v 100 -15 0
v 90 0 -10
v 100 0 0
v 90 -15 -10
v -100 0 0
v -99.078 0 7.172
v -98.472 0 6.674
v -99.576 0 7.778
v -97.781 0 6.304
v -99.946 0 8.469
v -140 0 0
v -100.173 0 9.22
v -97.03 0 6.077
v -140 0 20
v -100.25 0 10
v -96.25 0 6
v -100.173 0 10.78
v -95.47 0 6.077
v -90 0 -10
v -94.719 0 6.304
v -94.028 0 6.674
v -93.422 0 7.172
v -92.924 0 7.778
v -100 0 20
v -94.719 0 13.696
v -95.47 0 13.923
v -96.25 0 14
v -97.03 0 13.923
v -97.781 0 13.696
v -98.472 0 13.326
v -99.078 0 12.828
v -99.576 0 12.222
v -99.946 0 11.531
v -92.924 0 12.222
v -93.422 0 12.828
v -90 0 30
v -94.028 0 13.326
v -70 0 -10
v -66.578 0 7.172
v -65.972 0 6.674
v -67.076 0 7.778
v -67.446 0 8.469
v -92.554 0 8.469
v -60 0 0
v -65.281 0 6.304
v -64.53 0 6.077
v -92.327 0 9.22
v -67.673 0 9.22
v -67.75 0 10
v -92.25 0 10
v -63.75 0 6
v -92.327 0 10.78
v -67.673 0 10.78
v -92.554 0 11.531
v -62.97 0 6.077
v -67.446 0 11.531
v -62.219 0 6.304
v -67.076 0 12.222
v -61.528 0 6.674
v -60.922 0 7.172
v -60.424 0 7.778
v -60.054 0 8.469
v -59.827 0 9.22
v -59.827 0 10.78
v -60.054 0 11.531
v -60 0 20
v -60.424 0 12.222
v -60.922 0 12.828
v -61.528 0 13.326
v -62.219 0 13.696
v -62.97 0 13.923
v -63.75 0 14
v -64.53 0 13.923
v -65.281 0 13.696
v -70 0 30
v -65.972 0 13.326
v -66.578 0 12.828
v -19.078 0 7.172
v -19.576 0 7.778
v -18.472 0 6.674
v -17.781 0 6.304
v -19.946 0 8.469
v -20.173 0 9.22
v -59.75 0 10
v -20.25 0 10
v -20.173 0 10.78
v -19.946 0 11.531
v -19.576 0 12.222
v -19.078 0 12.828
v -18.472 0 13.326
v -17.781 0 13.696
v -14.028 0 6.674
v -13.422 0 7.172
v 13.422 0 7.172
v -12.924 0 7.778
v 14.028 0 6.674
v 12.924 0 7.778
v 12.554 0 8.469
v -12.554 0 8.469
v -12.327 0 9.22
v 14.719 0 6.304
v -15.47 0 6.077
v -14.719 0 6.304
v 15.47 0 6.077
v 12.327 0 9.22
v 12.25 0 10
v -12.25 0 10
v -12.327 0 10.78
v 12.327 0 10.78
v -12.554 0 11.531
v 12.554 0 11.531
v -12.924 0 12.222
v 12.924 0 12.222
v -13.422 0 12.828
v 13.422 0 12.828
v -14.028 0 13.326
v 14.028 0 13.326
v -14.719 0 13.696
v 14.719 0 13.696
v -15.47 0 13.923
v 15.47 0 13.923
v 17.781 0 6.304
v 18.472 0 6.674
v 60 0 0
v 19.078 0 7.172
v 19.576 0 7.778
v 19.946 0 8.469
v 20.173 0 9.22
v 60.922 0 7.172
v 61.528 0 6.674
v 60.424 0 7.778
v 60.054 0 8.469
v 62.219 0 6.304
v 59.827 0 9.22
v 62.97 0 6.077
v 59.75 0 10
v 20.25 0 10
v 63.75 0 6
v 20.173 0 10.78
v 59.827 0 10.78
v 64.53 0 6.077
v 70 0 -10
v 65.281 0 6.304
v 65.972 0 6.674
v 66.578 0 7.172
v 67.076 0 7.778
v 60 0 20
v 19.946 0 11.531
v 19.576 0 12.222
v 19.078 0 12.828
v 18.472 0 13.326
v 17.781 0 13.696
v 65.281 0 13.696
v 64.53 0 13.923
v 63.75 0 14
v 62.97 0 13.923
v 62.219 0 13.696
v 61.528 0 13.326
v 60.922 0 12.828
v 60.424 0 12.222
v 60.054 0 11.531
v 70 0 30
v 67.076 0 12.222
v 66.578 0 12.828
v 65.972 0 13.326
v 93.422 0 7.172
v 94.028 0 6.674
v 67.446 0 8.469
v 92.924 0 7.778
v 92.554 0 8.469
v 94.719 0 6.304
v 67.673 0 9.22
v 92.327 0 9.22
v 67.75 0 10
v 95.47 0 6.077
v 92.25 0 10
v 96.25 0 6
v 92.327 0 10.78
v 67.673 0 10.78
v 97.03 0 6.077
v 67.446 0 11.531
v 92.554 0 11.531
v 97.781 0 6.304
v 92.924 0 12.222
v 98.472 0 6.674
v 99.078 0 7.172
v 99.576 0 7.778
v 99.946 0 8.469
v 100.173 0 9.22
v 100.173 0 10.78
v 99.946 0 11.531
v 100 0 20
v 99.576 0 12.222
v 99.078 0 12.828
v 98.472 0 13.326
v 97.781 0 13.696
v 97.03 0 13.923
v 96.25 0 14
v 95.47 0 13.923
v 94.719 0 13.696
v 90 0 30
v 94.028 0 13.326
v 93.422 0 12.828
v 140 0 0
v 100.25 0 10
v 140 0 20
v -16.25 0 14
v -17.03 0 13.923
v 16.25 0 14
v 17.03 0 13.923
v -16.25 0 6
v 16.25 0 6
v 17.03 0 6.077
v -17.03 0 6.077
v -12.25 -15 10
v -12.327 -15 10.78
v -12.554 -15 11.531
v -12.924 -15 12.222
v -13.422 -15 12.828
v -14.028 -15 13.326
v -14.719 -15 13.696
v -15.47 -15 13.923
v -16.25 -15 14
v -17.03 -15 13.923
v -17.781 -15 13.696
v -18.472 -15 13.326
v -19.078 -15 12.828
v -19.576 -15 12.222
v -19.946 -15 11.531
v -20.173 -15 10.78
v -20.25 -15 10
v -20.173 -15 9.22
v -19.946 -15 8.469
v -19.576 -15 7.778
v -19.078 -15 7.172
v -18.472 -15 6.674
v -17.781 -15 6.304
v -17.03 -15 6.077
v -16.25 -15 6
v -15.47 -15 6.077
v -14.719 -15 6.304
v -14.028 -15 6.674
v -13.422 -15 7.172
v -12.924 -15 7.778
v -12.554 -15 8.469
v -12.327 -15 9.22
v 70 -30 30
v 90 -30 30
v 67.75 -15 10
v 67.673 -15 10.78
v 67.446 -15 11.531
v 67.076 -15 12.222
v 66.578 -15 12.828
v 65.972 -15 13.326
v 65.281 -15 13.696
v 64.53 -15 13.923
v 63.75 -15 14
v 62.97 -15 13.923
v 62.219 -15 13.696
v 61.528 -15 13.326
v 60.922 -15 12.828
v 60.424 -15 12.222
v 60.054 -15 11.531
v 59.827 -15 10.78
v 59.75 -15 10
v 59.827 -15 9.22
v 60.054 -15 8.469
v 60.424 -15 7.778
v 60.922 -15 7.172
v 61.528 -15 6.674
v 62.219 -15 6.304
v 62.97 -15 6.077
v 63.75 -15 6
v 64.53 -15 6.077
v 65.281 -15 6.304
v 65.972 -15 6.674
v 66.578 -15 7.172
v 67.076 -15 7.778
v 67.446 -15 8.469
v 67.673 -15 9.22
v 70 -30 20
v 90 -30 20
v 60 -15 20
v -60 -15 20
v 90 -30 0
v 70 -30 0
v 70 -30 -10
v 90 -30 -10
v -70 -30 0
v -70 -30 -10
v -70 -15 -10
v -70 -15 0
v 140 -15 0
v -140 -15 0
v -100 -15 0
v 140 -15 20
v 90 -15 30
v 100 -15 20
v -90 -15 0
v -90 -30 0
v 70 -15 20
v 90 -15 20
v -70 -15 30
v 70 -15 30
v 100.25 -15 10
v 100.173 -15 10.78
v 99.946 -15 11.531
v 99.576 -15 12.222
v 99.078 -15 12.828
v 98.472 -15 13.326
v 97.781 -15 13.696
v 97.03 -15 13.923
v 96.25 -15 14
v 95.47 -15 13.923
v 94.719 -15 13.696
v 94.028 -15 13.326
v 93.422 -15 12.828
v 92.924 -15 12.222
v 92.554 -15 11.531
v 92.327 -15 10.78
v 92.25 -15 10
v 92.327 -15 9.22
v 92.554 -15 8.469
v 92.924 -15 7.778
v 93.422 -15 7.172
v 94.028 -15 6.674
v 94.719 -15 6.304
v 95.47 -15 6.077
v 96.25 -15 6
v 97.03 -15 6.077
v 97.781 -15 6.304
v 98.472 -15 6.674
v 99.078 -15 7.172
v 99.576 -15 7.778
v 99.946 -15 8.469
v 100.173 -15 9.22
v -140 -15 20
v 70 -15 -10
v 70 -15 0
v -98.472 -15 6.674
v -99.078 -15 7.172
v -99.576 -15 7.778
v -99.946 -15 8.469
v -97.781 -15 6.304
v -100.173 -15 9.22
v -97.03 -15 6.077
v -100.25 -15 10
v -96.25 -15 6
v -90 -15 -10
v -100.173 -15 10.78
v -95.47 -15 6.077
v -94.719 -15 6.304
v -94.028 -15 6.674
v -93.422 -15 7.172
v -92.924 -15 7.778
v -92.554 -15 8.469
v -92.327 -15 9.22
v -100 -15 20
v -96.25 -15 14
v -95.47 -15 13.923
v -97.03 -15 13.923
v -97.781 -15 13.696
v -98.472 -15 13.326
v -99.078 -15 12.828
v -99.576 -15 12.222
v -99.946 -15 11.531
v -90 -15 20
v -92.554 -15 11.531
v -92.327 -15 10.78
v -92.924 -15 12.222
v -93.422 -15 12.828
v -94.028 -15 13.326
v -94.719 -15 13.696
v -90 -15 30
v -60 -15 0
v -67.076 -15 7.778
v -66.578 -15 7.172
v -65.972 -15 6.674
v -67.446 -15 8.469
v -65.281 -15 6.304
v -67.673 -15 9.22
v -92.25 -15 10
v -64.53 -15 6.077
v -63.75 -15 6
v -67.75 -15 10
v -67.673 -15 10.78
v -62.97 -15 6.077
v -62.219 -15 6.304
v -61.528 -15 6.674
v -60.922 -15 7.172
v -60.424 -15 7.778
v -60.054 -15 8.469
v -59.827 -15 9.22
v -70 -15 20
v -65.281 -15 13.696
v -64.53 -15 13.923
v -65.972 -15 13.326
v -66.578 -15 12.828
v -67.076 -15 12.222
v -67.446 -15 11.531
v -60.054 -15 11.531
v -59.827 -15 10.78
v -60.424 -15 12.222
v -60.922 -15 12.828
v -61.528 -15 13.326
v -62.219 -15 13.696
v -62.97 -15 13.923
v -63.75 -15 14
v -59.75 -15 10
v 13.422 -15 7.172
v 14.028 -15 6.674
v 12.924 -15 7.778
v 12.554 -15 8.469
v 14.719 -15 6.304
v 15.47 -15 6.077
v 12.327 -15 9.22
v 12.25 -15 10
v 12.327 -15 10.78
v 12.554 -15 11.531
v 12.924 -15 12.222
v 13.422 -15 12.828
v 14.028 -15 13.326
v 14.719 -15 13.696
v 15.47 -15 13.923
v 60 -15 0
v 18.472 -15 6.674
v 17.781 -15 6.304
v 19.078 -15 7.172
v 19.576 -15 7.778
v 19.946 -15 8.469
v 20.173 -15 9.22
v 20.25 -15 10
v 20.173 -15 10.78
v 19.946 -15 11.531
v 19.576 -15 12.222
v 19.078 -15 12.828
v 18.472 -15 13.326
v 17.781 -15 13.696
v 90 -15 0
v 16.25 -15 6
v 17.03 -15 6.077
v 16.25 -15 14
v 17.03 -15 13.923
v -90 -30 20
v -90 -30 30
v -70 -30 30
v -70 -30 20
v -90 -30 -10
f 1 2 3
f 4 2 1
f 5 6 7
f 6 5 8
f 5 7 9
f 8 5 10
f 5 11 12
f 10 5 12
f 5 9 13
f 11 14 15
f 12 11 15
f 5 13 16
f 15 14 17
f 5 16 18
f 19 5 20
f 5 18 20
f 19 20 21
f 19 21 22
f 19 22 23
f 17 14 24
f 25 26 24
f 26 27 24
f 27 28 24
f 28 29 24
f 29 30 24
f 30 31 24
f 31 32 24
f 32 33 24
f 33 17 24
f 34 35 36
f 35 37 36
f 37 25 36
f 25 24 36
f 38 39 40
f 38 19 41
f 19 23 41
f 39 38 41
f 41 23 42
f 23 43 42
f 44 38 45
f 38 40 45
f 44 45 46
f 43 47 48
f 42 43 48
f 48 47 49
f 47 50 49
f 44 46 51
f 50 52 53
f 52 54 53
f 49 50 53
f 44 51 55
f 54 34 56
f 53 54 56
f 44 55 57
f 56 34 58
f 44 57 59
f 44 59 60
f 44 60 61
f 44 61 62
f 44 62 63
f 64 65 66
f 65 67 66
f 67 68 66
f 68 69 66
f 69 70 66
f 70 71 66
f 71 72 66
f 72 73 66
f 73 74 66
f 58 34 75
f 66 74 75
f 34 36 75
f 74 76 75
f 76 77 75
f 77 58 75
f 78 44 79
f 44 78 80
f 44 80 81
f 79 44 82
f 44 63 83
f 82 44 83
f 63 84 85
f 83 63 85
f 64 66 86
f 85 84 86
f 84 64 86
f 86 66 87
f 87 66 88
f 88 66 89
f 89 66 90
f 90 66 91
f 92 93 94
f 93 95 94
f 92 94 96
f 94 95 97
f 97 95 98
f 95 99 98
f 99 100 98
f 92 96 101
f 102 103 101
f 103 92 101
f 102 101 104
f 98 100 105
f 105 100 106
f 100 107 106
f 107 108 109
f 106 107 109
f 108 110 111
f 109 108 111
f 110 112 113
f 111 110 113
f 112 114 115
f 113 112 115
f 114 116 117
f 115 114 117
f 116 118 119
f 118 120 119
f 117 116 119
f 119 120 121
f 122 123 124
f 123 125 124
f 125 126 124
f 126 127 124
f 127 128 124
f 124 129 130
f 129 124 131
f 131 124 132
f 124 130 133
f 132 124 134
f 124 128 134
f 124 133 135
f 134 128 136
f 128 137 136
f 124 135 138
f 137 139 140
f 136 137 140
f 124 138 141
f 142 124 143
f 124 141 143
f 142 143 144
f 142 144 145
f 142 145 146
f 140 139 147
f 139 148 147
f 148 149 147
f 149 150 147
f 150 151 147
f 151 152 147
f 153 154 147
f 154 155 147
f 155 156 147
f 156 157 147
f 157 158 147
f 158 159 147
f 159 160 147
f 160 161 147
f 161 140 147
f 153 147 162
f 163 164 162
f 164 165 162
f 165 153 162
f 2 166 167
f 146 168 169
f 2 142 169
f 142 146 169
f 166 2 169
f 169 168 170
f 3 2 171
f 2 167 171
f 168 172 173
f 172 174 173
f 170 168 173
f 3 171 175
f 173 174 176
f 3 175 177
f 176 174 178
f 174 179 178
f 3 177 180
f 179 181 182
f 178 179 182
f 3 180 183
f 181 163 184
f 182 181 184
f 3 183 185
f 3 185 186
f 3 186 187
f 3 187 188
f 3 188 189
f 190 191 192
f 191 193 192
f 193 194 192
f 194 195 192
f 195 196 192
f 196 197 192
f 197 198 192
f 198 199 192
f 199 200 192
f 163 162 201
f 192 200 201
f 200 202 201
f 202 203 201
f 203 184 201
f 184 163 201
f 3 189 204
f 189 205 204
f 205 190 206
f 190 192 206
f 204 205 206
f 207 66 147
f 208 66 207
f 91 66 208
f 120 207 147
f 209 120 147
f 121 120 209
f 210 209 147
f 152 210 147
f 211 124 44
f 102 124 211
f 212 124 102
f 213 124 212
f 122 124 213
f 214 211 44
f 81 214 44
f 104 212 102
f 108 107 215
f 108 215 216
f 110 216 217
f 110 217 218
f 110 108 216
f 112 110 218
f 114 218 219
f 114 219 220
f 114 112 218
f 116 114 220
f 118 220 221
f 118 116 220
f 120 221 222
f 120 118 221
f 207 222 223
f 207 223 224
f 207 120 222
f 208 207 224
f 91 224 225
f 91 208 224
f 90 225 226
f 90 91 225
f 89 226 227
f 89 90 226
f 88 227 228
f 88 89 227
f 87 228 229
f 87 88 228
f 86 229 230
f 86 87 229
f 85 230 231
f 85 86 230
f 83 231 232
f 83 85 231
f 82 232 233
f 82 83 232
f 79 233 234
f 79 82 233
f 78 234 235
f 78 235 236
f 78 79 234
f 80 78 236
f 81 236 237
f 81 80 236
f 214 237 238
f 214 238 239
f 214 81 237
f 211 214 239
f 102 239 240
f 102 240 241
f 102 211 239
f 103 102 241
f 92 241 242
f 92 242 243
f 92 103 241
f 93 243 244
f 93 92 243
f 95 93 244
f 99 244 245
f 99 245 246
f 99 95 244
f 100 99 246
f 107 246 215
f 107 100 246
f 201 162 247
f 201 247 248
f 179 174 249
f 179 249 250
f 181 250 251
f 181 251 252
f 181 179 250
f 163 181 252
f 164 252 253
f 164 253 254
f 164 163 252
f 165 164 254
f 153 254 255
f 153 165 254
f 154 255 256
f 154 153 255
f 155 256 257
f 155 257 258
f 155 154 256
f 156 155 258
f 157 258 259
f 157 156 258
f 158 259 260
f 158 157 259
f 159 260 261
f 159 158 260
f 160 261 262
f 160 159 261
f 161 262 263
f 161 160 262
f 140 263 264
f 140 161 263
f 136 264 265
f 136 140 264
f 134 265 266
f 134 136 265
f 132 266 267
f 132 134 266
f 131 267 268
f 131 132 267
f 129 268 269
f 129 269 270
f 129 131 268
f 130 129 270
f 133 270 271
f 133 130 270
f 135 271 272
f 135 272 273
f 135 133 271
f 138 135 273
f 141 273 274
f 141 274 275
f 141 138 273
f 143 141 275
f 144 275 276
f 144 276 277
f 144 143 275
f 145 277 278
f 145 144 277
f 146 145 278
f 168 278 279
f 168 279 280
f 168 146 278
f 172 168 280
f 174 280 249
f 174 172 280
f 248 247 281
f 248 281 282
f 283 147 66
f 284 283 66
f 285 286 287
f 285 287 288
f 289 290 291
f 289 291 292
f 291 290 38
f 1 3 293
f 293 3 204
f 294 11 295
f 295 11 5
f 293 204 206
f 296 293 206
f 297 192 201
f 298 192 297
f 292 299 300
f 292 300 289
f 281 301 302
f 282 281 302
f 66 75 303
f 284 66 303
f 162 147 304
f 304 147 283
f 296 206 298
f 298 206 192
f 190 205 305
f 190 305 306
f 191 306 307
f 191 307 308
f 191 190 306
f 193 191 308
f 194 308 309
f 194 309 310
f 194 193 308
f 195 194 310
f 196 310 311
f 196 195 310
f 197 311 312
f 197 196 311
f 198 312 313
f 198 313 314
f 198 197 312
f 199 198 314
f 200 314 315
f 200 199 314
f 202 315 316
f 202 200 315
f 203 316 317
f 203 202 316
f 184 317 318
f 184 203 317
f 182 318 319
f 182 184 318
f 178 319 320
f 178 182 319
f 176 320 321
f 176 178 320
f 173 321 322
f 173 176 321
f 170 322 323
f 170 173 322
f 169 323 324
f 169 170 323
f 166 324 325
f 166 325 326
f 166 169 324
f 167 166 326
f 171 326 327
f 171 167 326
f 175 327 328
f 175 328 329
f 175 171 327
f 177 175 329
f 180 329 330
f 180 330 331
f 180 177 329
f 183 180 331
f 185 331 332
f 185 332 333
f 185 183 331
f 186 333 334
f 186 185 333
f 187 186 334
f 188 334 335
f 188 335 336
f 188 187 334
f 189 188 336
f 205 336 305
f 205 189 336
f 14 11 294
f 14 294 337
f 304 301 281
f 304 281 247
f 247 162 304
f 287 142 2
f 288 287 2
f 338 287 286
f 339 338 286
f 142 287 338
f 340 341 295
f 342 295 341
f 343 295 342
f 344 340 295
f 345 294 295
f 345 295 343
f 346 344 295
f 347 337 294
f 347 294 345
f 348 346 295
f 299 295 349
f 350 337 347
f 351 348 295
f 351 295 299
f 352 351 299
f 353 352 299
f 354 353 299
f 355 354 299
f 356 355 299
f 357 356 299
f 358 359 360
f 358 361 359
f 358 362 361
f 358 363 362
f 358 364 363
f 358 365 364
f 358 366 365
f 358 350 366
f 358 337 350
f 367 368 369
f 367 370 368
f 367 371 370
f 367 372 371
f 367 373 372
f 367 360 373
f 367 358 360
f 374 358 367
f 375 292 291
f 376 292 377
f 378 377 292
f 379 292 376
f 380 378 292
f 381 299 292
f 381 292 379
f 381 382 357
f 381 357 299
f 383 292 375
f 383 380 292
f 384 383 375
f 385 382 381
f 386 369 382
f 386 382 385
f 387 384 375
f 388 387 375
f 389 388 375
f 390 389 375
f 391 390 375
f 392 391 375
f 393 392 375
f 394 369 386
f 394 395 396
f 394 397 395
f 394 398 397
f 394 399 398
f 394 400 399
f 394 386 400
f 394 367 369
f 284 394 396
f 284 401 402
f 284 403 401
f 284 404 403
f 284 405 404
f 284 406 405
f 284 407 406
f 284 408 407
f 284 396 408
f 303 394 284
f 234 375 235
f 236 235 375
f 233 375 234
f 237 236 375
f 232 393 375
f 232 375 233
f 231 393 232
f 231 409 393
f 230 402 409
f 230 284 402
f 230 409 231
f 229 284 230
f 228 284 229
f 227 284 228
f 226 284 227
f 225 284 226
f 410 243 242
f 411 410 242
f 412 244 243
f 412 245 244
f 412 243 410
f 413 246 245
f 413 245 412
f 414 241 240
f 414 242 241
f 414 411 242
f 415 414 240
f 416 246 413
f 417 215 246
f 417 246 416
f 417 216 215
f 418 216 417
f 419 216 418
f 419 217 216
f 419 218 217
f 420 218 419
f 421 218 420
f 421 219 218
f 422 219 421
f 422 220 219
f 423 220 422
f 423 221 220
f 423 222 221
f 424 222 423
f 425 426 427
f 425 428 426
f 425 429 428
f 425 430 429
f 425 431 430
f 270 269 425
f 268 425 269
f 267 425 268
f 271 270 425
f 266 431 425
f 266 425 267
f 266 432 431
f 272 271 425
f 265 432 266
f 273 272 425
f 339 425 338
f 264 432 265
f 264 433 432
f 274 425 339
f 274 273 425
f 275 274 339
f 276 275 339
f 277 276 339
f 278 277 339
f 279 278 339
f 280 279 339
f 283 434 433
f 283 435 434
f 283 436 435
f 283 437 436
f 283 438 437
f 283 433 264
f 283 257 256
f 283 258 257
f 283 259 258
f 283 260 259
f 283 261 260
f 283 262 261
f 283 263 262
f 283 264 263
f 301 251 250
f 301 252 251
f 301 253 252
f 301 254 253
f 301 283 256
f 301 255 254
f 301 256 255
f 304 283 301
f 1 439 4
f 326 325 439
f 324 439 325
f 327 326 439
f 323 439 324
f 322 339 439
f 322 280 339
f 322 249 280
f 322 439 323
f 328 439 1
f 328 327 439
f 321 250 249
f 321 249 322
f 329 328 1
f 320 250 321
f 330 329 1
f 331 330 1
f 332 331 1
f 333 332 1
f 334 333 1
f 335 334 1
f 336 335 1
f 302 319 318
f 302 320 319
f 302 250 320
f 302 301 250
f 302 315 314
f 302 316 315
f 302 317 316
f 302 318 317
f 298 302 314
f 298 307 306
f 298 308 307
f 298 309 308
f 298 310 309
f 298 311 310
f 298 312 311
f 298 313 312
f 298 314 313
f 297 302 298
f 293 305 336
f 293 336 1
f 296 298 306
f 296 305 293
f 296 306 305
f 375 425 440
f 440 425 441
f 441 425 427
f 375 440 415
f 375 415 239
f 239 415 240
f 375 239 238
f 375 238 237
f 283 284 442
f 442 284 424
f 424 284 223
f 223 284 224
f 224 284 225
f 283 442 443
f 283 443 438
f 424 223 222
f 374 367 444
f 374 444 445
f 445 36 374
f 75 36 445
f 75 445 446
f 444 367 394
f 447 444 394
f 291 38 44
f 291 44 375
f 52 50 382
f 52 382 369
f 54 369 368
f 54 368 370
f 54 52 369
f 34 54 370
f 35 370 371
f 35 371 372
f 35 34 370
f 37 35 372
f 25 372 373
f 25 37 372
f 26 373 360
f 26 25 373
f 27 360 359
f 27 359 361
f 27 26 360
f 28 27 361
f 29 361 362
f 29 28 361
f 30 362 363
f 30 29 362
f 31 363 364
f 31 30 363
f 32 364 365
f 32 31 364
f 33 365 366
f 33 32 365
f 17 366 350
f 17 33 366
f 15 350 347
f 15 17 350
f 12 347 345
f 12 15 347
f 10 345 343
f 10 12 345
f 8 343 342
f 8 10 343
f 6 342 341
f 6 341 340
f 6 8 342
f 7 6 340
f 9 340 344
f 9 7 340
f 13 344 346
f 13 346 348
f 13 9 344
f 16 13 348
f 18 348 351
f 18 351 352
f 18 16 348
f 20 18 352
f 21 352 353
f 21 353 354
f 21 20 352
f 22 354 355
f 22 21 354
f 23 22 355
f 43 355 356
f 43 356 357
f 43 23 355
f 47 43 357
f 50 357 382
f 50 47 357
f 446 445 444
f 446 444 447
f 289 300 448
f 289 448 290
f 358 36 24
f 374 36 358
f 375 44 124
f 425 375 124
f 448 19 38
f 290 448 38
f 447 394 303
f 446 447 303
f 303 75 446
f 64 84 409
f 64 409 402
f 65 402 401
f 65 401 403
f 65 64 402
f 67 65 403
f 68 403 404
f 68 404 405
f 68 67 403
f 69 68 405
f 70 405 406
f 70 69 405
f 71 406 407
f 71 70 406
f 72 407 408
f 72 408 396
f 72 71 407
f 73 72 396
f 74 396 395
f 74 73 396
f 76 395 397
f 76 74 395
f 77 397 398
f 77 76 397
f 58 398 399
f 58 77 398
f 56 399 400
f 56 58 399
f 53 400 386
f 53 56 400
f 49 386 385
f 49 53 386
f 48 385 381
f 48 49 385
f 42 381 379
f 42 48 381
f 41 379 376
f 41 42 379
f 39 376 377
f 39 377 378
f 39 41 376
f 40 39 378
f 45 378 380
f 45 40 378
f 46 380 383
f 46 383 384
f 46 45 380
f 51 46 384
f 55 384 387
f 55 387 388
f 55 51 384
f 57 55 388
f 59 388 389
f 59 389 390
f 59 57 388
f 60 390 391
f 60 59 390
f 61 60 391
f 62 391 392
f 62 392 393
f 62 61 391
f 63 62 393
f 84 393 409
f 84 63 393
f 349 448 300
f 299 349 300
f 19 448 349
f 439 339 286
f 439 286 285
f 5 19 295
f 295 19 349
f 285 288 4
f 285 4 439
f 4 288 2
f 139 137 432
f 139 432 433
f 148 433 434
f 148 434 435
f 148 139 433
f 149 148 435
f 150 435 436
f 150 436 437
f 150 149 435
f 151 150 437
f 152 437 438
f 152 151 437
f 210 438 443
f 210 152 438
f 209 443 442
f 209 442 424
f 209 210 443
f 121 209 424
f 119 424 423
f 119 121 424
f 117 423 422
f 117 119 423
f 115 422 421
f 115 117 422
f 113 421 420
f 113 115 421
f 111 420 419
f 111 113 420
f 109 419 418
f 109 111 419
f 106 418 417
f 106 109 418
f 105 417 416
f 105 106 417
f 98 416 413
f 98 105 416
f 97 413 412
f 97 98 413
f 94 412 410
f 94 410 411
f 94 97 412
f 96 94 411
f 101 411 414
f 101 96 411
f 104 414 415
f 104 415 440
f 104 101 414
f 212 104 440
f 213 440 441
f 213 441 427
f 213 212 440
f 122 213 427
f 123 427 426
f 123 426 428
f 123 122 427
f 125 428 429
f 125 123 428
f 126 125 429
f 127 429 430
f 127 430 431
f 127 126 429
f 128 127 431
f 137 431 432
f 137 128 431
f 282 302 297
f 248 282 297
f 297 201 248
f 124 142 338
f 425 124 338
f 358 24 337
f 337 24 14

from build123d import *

# Parameters (mm, degrees)
F0_W     = 50
F0_H     = 20
F0_R     = 4
F0_W_2   = 20
F0_W_3   = 140
F1_DEPTH = 15
F0_H_2   = 10
F2_DEPTH = 30
F3_SIZE  = 9.99999


# Not quite as in the source:
# - a fillet or chamfer is up to 0.001 mm smaller than in the source, because OpenCascade refuses the exact size
# - a feature names something its author has since deleted; it is built from what else it names


with BuildPart() as f1:
    # F0 (on Front) → F1 (new body)
    with BuildSketch(Plane.XZ):
        with Locations((-115, 10)):
            Rectangle(F0_W, F0_H)
        with Locations((-96.25, 10)):
            Circle(F0_R, mode=Mode.SUBTRACT)
        with Locations((-80, 10)):
            Rectangle(F0_W_2, F0_H)
        with Locations((80, 10)):
            Rectangle(F0_W_2, F0_H)
        with Locations((115, 10)):
            Rectangle(F0_W, F0_H)
        with Locations((96.25, 10)):
            Circle(F0_R, mode=Mode.SUBTRACT)
        with Locations((0, 10)):
            Rectangle(F0_W_3, F0_H)
        with Locations((-63.75, 10)):
            Circle(F0_R, mode=Mode.SUBTRACT)
        with Locations((-16.25, 10)):
            Circle(F0_R, mode=Mode.SUBTRACT)
        with Locations((16.25, 10)):
            Circle(F0_R, mode=Mode.SUBTRACT)
        with Locations((63.75, 10)):
            Circle(F0_R, mode=Mode.SUBTRACT)
    extrude(amount=F1_DEPTH)

    # F0 (on Front) → F2 (join)
    with BuildSketch(Plane.XZ):
        with Locations((80, 25)):
            Rectangle(F0_W_2, F0_H_2)
        with Locations((-80, 25)):
            Rectangle(F0_W_2, F0_H_2)
        with Locations((-80, -5)):
            Rectangle(F0_W_2, F0_H_2)
        with Locations((80, -5)):
            Rectangle(F0_W_2, F0_H_2)
    extrude(amount=F2_DEPTH)

    # F3 (size 10 in the source; OpenCascade refuses exactly that, so slightly less here)
    f3_edges = [f1.edges().sort_by_distance(p)[0] for p in [
        (70, -7.5, 20),
        (90, -7.5, 20),
        (-70, -7.5, 20),
        (-90, -7.5, 20),
        (-90, -7.5, 0),
        (-70, -7.5, 0),
        (70, -7.5, 0),
        (90, -7.5, 0),
    ]]
    chamfer(f3_edges, length=F3_SIZE)


solid = f1.part
